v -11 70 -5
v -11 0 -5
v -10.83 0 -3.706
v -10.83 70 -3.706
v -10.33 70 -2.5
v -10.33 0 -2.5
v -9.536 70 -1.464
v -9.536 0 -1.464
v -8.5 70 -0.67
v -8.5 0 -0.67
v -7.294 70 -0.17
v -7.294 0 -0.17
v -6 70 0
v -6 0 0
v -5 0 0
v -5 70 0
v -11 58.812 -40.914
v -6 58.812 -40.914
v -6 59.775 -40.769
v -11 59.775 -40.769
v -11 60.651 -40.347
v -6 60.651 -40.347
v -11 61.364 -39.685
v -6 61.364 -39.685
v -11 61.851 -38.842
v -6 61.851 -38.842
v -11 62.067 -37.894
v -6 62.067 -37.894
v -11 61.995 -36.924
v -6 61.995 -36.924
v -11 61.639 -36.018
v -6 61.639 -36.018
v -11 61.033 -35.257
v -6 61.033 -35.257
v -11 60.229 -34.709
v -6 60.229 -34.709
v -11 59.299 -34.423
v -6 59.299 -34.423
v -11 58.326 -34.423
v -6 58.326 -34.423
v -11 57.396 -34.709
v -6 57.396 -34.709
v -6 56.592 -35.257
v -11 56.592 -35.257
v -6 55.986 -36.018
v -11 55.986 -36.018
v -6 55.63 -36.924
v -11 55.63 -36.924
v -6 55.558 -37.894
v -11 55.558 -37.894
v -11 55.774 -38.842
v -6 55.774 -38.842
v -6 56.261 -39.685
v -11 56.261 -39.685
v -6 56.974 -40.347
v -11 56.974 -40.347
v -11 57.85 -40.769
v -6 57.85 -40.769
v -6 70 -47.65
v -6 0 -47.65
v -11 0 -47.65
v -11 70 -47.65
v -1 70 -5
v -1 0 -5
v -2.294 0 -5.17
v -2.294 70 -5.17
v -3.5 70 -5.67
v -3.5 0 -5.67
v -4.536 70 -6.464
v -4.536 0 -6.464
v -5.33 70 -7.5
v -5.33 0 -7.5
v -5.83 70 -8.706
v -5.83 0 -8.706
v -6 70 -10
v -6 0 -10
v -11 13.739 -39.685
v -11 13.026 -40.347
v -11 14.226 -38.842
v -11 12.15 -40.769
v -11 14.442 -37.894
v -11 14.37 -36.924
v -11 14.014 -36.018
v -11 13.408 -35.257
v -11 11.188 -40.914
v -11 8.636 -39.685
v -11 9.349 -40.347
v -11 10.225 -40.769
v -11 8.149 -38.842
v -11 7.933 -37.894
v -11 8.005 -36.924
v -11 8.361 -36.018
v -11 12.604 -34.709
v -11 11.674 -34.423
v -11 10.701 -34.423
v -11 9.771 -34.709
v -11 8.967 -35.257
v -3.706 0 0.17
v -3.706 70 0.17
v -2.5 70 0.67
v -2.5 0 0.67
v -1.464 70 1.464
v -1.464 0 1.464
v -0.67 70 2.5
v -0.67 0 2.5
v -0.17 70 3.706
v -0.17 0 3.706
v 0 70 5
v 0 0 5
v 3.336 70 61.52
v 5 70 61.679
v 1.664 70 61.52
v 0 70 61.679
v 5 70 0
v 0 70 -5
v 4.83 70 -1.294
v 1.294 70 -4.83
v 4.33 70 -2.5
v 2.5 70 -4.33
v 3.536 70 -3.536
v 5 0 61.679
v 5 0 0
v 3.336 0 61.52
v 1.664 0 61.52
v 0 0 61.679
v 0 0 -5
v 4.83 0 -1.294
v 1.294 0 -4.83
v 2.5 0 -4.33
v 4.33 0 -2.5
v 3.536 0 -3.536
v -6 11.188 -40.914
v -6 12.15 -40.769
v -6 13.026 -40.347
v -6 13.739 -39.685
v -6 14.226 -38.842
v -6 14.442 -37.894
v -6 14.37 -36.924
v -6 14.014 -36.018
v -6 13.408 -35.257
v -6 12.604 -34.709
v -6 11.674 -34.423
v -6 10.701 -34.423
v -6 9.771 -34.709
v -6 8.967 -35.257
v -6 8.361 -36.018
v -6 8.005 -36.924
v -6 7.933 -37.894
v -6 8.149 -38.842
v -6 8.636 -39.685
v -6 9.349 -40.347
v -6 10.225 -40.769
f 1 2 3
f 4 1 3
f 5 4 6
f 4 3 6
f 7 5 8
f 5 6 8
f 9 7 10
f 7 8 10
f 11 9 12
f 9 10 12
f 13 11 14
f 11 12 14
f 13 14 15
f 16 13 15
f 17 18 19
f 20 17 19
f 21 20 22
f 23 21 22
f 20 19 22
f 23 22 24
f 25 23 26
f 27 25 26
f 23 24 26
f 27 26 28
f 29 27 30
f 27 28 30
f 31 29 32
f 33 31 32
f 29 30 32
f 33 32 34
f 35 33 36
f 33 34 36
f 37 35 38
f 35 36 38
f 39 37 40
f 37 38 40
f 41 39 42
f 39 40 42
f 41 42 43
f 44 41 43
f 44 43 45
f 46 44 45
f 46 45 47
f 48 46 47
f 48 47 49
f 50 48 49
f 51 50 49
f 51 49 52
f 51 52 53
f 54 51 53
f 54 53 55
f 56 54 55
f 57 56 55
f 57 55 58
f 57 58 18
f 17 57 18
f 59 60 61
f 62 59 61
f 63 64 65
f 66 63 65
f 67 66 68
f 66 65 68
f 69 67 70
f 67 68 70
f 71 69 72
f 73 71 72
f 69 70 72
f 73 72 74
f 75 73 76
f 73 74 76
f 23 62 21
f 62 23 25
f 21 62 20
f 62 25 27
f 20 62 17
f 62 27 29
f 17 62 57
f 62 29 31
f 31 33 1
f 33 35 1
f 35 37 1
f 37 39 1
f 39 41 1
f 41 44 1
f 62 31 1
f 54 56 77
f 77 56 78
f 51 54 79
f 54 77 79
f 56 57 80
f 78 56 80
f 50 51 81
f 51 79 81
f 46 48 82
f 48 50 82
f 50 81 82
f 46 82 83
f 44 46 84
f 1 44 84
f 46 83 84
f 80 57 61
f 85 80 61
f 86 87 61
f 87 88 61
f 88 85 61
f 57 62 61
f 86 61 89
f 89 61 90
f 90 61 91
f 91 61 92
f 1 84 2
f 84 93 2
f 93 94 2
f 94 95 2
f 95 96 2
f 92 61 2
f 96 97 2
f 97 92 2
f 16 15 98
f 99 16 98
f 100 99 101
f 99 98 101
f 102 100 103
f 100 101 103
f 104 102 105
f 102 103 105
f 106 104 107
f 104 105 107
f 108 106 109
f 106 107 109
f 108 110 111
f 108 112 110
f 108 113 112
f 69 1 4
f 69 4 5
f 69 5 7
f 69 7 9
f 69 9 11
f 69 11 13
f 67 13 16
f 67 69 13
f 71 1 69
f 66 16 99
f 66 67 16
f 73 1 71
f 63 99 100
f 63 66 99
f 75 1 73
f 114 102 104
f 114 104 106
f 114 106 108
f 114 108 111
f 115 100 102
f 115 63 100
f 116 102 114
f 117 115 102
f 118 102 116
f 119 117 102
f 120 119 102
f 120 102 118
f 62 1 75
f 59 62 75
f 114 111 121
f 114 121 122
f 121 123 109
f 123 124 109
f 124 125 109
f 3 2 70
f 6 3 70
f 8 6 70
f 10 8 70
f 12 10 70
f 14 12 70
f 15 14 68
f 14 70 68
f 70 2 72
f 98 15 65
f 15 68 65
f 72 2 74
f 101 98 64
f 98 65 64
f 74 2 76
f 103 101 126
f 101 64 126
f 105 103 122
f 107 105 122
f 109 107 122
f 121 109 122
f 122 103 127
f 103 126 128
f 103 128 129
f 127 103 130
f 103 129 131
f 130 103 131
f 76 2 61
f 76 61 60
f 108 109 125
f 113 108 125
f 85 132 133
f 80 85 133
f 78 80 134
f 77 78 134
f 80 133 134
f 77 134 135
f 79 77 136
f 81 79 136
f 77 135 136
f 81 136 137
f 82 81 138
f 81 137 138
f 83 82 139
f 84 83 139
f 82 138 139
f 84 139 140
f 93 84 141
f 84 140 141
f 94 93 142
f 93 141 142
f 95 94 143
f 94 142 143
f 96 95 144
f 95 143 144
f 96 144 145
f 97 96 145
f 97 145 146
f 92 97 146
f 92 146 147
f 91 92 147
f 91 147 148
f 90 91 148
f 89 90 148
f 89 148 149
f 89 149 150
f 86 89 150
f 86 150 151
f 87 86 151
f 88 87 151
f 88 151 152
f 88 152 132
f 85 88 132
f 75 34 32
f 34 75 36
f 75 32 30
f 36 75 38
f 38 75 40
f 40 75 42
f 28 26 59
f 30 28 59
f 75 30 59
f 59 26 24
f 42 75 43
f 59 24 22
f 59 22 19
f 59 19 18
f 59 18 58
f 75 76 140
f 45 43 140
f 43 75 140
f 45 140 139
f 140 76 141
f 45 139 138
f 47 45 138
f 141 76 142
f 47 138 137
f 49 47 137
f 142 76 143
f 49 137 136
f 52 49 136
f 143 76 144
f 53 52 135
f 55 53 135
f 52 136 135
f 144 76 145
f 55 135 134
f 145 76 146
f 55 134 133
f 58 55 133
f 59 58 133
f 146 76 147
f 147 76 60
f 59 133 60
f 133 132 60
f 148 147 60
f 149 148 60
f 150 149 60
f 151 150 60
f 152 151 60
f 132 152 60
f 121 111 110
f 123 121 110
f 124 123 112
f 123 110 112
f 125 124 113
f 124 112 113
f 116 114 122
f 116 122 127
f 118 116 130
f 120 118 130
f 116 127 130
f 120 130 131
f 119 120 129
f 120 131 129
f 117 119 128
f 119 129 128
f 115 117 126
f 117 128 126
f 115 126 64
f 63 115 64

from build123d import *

# Parameters (mm, degrees)
BOSS_EXTRUDE1_DEPTH = 70
SKETCH2_R           = 3.2639
CUT_EXTRUDE1_DEPTH  = 70
SKETCH3_R           = 17.5
CUT_EXTRUDE2_DEPTH  = 71


with BuildPart() as part:
    # Sketch1 → Boss-Extrude1 (new body)
    with BuildSketch(Plane(origin=(0, 0, 0), x_dir=(1, 0, 0), z_dir=(0, 1, 0))):
        with BuildLine():
            Line((0, -5), (0, -85))
            Line((0, -85), (5, -85))
            Line((5, -85), (5, 0))
            ThreePointArc((5, 0), (3.535533906, 3.535533906), (0, 5))
            Line((0, 5), (-1, 5))
            ThreePointArc((-1, 5), (-4.535533906, 6.464466094), (-6, 10))
            Line((-6, 10), (-6, 47.65))
            Line((-6, 47.65), (-11, 47.65))
            Line((-11, 47.65), (-11, 5))
            ThreePointArc((-11, 5), (-9.535533906, 1.464466094), (-6, 0))
            Line((-6, 0), (-5, 0))
            ThreePointArc((-5, 0), (-1.464466094, -1.464466094), (0, -5))
        make_face()
    extrude(amount=BOSS_EXTRUDE1_DEPTH)

    # Sketch2 → Cut-Extrude1 (cut)
    with BuildSketch(Plane(origin=(-6, 0, 0), x_dir=(0, 0, -1), z_dir=(1, 0, 0))):
        with Locations((37.65, 58.8125)):
            Circle(SKETCH2_R)
        with Locations((37.65, 11.1875)):
            Circle(SKETCH2_R)
    extrude(amount=-CUT_EXTRUDE1_DEPTH, mode=Mode.SUBTRACT)

    # Sketch3 → Cut-Extrude2 (cut, through all)
    with BuildSketch(Plane(origin=(0, 70, 0), x_dir=(1, 0, 0), z_dir=(0, 1, 0))):
        with Locations((2.5, -79)):
            Circle(SKETCH3_R)
    extrude(amount=-CUT_EXTRUDE2_DEPTH, mode=Mode.SUBTRACT)


solid = part.part
